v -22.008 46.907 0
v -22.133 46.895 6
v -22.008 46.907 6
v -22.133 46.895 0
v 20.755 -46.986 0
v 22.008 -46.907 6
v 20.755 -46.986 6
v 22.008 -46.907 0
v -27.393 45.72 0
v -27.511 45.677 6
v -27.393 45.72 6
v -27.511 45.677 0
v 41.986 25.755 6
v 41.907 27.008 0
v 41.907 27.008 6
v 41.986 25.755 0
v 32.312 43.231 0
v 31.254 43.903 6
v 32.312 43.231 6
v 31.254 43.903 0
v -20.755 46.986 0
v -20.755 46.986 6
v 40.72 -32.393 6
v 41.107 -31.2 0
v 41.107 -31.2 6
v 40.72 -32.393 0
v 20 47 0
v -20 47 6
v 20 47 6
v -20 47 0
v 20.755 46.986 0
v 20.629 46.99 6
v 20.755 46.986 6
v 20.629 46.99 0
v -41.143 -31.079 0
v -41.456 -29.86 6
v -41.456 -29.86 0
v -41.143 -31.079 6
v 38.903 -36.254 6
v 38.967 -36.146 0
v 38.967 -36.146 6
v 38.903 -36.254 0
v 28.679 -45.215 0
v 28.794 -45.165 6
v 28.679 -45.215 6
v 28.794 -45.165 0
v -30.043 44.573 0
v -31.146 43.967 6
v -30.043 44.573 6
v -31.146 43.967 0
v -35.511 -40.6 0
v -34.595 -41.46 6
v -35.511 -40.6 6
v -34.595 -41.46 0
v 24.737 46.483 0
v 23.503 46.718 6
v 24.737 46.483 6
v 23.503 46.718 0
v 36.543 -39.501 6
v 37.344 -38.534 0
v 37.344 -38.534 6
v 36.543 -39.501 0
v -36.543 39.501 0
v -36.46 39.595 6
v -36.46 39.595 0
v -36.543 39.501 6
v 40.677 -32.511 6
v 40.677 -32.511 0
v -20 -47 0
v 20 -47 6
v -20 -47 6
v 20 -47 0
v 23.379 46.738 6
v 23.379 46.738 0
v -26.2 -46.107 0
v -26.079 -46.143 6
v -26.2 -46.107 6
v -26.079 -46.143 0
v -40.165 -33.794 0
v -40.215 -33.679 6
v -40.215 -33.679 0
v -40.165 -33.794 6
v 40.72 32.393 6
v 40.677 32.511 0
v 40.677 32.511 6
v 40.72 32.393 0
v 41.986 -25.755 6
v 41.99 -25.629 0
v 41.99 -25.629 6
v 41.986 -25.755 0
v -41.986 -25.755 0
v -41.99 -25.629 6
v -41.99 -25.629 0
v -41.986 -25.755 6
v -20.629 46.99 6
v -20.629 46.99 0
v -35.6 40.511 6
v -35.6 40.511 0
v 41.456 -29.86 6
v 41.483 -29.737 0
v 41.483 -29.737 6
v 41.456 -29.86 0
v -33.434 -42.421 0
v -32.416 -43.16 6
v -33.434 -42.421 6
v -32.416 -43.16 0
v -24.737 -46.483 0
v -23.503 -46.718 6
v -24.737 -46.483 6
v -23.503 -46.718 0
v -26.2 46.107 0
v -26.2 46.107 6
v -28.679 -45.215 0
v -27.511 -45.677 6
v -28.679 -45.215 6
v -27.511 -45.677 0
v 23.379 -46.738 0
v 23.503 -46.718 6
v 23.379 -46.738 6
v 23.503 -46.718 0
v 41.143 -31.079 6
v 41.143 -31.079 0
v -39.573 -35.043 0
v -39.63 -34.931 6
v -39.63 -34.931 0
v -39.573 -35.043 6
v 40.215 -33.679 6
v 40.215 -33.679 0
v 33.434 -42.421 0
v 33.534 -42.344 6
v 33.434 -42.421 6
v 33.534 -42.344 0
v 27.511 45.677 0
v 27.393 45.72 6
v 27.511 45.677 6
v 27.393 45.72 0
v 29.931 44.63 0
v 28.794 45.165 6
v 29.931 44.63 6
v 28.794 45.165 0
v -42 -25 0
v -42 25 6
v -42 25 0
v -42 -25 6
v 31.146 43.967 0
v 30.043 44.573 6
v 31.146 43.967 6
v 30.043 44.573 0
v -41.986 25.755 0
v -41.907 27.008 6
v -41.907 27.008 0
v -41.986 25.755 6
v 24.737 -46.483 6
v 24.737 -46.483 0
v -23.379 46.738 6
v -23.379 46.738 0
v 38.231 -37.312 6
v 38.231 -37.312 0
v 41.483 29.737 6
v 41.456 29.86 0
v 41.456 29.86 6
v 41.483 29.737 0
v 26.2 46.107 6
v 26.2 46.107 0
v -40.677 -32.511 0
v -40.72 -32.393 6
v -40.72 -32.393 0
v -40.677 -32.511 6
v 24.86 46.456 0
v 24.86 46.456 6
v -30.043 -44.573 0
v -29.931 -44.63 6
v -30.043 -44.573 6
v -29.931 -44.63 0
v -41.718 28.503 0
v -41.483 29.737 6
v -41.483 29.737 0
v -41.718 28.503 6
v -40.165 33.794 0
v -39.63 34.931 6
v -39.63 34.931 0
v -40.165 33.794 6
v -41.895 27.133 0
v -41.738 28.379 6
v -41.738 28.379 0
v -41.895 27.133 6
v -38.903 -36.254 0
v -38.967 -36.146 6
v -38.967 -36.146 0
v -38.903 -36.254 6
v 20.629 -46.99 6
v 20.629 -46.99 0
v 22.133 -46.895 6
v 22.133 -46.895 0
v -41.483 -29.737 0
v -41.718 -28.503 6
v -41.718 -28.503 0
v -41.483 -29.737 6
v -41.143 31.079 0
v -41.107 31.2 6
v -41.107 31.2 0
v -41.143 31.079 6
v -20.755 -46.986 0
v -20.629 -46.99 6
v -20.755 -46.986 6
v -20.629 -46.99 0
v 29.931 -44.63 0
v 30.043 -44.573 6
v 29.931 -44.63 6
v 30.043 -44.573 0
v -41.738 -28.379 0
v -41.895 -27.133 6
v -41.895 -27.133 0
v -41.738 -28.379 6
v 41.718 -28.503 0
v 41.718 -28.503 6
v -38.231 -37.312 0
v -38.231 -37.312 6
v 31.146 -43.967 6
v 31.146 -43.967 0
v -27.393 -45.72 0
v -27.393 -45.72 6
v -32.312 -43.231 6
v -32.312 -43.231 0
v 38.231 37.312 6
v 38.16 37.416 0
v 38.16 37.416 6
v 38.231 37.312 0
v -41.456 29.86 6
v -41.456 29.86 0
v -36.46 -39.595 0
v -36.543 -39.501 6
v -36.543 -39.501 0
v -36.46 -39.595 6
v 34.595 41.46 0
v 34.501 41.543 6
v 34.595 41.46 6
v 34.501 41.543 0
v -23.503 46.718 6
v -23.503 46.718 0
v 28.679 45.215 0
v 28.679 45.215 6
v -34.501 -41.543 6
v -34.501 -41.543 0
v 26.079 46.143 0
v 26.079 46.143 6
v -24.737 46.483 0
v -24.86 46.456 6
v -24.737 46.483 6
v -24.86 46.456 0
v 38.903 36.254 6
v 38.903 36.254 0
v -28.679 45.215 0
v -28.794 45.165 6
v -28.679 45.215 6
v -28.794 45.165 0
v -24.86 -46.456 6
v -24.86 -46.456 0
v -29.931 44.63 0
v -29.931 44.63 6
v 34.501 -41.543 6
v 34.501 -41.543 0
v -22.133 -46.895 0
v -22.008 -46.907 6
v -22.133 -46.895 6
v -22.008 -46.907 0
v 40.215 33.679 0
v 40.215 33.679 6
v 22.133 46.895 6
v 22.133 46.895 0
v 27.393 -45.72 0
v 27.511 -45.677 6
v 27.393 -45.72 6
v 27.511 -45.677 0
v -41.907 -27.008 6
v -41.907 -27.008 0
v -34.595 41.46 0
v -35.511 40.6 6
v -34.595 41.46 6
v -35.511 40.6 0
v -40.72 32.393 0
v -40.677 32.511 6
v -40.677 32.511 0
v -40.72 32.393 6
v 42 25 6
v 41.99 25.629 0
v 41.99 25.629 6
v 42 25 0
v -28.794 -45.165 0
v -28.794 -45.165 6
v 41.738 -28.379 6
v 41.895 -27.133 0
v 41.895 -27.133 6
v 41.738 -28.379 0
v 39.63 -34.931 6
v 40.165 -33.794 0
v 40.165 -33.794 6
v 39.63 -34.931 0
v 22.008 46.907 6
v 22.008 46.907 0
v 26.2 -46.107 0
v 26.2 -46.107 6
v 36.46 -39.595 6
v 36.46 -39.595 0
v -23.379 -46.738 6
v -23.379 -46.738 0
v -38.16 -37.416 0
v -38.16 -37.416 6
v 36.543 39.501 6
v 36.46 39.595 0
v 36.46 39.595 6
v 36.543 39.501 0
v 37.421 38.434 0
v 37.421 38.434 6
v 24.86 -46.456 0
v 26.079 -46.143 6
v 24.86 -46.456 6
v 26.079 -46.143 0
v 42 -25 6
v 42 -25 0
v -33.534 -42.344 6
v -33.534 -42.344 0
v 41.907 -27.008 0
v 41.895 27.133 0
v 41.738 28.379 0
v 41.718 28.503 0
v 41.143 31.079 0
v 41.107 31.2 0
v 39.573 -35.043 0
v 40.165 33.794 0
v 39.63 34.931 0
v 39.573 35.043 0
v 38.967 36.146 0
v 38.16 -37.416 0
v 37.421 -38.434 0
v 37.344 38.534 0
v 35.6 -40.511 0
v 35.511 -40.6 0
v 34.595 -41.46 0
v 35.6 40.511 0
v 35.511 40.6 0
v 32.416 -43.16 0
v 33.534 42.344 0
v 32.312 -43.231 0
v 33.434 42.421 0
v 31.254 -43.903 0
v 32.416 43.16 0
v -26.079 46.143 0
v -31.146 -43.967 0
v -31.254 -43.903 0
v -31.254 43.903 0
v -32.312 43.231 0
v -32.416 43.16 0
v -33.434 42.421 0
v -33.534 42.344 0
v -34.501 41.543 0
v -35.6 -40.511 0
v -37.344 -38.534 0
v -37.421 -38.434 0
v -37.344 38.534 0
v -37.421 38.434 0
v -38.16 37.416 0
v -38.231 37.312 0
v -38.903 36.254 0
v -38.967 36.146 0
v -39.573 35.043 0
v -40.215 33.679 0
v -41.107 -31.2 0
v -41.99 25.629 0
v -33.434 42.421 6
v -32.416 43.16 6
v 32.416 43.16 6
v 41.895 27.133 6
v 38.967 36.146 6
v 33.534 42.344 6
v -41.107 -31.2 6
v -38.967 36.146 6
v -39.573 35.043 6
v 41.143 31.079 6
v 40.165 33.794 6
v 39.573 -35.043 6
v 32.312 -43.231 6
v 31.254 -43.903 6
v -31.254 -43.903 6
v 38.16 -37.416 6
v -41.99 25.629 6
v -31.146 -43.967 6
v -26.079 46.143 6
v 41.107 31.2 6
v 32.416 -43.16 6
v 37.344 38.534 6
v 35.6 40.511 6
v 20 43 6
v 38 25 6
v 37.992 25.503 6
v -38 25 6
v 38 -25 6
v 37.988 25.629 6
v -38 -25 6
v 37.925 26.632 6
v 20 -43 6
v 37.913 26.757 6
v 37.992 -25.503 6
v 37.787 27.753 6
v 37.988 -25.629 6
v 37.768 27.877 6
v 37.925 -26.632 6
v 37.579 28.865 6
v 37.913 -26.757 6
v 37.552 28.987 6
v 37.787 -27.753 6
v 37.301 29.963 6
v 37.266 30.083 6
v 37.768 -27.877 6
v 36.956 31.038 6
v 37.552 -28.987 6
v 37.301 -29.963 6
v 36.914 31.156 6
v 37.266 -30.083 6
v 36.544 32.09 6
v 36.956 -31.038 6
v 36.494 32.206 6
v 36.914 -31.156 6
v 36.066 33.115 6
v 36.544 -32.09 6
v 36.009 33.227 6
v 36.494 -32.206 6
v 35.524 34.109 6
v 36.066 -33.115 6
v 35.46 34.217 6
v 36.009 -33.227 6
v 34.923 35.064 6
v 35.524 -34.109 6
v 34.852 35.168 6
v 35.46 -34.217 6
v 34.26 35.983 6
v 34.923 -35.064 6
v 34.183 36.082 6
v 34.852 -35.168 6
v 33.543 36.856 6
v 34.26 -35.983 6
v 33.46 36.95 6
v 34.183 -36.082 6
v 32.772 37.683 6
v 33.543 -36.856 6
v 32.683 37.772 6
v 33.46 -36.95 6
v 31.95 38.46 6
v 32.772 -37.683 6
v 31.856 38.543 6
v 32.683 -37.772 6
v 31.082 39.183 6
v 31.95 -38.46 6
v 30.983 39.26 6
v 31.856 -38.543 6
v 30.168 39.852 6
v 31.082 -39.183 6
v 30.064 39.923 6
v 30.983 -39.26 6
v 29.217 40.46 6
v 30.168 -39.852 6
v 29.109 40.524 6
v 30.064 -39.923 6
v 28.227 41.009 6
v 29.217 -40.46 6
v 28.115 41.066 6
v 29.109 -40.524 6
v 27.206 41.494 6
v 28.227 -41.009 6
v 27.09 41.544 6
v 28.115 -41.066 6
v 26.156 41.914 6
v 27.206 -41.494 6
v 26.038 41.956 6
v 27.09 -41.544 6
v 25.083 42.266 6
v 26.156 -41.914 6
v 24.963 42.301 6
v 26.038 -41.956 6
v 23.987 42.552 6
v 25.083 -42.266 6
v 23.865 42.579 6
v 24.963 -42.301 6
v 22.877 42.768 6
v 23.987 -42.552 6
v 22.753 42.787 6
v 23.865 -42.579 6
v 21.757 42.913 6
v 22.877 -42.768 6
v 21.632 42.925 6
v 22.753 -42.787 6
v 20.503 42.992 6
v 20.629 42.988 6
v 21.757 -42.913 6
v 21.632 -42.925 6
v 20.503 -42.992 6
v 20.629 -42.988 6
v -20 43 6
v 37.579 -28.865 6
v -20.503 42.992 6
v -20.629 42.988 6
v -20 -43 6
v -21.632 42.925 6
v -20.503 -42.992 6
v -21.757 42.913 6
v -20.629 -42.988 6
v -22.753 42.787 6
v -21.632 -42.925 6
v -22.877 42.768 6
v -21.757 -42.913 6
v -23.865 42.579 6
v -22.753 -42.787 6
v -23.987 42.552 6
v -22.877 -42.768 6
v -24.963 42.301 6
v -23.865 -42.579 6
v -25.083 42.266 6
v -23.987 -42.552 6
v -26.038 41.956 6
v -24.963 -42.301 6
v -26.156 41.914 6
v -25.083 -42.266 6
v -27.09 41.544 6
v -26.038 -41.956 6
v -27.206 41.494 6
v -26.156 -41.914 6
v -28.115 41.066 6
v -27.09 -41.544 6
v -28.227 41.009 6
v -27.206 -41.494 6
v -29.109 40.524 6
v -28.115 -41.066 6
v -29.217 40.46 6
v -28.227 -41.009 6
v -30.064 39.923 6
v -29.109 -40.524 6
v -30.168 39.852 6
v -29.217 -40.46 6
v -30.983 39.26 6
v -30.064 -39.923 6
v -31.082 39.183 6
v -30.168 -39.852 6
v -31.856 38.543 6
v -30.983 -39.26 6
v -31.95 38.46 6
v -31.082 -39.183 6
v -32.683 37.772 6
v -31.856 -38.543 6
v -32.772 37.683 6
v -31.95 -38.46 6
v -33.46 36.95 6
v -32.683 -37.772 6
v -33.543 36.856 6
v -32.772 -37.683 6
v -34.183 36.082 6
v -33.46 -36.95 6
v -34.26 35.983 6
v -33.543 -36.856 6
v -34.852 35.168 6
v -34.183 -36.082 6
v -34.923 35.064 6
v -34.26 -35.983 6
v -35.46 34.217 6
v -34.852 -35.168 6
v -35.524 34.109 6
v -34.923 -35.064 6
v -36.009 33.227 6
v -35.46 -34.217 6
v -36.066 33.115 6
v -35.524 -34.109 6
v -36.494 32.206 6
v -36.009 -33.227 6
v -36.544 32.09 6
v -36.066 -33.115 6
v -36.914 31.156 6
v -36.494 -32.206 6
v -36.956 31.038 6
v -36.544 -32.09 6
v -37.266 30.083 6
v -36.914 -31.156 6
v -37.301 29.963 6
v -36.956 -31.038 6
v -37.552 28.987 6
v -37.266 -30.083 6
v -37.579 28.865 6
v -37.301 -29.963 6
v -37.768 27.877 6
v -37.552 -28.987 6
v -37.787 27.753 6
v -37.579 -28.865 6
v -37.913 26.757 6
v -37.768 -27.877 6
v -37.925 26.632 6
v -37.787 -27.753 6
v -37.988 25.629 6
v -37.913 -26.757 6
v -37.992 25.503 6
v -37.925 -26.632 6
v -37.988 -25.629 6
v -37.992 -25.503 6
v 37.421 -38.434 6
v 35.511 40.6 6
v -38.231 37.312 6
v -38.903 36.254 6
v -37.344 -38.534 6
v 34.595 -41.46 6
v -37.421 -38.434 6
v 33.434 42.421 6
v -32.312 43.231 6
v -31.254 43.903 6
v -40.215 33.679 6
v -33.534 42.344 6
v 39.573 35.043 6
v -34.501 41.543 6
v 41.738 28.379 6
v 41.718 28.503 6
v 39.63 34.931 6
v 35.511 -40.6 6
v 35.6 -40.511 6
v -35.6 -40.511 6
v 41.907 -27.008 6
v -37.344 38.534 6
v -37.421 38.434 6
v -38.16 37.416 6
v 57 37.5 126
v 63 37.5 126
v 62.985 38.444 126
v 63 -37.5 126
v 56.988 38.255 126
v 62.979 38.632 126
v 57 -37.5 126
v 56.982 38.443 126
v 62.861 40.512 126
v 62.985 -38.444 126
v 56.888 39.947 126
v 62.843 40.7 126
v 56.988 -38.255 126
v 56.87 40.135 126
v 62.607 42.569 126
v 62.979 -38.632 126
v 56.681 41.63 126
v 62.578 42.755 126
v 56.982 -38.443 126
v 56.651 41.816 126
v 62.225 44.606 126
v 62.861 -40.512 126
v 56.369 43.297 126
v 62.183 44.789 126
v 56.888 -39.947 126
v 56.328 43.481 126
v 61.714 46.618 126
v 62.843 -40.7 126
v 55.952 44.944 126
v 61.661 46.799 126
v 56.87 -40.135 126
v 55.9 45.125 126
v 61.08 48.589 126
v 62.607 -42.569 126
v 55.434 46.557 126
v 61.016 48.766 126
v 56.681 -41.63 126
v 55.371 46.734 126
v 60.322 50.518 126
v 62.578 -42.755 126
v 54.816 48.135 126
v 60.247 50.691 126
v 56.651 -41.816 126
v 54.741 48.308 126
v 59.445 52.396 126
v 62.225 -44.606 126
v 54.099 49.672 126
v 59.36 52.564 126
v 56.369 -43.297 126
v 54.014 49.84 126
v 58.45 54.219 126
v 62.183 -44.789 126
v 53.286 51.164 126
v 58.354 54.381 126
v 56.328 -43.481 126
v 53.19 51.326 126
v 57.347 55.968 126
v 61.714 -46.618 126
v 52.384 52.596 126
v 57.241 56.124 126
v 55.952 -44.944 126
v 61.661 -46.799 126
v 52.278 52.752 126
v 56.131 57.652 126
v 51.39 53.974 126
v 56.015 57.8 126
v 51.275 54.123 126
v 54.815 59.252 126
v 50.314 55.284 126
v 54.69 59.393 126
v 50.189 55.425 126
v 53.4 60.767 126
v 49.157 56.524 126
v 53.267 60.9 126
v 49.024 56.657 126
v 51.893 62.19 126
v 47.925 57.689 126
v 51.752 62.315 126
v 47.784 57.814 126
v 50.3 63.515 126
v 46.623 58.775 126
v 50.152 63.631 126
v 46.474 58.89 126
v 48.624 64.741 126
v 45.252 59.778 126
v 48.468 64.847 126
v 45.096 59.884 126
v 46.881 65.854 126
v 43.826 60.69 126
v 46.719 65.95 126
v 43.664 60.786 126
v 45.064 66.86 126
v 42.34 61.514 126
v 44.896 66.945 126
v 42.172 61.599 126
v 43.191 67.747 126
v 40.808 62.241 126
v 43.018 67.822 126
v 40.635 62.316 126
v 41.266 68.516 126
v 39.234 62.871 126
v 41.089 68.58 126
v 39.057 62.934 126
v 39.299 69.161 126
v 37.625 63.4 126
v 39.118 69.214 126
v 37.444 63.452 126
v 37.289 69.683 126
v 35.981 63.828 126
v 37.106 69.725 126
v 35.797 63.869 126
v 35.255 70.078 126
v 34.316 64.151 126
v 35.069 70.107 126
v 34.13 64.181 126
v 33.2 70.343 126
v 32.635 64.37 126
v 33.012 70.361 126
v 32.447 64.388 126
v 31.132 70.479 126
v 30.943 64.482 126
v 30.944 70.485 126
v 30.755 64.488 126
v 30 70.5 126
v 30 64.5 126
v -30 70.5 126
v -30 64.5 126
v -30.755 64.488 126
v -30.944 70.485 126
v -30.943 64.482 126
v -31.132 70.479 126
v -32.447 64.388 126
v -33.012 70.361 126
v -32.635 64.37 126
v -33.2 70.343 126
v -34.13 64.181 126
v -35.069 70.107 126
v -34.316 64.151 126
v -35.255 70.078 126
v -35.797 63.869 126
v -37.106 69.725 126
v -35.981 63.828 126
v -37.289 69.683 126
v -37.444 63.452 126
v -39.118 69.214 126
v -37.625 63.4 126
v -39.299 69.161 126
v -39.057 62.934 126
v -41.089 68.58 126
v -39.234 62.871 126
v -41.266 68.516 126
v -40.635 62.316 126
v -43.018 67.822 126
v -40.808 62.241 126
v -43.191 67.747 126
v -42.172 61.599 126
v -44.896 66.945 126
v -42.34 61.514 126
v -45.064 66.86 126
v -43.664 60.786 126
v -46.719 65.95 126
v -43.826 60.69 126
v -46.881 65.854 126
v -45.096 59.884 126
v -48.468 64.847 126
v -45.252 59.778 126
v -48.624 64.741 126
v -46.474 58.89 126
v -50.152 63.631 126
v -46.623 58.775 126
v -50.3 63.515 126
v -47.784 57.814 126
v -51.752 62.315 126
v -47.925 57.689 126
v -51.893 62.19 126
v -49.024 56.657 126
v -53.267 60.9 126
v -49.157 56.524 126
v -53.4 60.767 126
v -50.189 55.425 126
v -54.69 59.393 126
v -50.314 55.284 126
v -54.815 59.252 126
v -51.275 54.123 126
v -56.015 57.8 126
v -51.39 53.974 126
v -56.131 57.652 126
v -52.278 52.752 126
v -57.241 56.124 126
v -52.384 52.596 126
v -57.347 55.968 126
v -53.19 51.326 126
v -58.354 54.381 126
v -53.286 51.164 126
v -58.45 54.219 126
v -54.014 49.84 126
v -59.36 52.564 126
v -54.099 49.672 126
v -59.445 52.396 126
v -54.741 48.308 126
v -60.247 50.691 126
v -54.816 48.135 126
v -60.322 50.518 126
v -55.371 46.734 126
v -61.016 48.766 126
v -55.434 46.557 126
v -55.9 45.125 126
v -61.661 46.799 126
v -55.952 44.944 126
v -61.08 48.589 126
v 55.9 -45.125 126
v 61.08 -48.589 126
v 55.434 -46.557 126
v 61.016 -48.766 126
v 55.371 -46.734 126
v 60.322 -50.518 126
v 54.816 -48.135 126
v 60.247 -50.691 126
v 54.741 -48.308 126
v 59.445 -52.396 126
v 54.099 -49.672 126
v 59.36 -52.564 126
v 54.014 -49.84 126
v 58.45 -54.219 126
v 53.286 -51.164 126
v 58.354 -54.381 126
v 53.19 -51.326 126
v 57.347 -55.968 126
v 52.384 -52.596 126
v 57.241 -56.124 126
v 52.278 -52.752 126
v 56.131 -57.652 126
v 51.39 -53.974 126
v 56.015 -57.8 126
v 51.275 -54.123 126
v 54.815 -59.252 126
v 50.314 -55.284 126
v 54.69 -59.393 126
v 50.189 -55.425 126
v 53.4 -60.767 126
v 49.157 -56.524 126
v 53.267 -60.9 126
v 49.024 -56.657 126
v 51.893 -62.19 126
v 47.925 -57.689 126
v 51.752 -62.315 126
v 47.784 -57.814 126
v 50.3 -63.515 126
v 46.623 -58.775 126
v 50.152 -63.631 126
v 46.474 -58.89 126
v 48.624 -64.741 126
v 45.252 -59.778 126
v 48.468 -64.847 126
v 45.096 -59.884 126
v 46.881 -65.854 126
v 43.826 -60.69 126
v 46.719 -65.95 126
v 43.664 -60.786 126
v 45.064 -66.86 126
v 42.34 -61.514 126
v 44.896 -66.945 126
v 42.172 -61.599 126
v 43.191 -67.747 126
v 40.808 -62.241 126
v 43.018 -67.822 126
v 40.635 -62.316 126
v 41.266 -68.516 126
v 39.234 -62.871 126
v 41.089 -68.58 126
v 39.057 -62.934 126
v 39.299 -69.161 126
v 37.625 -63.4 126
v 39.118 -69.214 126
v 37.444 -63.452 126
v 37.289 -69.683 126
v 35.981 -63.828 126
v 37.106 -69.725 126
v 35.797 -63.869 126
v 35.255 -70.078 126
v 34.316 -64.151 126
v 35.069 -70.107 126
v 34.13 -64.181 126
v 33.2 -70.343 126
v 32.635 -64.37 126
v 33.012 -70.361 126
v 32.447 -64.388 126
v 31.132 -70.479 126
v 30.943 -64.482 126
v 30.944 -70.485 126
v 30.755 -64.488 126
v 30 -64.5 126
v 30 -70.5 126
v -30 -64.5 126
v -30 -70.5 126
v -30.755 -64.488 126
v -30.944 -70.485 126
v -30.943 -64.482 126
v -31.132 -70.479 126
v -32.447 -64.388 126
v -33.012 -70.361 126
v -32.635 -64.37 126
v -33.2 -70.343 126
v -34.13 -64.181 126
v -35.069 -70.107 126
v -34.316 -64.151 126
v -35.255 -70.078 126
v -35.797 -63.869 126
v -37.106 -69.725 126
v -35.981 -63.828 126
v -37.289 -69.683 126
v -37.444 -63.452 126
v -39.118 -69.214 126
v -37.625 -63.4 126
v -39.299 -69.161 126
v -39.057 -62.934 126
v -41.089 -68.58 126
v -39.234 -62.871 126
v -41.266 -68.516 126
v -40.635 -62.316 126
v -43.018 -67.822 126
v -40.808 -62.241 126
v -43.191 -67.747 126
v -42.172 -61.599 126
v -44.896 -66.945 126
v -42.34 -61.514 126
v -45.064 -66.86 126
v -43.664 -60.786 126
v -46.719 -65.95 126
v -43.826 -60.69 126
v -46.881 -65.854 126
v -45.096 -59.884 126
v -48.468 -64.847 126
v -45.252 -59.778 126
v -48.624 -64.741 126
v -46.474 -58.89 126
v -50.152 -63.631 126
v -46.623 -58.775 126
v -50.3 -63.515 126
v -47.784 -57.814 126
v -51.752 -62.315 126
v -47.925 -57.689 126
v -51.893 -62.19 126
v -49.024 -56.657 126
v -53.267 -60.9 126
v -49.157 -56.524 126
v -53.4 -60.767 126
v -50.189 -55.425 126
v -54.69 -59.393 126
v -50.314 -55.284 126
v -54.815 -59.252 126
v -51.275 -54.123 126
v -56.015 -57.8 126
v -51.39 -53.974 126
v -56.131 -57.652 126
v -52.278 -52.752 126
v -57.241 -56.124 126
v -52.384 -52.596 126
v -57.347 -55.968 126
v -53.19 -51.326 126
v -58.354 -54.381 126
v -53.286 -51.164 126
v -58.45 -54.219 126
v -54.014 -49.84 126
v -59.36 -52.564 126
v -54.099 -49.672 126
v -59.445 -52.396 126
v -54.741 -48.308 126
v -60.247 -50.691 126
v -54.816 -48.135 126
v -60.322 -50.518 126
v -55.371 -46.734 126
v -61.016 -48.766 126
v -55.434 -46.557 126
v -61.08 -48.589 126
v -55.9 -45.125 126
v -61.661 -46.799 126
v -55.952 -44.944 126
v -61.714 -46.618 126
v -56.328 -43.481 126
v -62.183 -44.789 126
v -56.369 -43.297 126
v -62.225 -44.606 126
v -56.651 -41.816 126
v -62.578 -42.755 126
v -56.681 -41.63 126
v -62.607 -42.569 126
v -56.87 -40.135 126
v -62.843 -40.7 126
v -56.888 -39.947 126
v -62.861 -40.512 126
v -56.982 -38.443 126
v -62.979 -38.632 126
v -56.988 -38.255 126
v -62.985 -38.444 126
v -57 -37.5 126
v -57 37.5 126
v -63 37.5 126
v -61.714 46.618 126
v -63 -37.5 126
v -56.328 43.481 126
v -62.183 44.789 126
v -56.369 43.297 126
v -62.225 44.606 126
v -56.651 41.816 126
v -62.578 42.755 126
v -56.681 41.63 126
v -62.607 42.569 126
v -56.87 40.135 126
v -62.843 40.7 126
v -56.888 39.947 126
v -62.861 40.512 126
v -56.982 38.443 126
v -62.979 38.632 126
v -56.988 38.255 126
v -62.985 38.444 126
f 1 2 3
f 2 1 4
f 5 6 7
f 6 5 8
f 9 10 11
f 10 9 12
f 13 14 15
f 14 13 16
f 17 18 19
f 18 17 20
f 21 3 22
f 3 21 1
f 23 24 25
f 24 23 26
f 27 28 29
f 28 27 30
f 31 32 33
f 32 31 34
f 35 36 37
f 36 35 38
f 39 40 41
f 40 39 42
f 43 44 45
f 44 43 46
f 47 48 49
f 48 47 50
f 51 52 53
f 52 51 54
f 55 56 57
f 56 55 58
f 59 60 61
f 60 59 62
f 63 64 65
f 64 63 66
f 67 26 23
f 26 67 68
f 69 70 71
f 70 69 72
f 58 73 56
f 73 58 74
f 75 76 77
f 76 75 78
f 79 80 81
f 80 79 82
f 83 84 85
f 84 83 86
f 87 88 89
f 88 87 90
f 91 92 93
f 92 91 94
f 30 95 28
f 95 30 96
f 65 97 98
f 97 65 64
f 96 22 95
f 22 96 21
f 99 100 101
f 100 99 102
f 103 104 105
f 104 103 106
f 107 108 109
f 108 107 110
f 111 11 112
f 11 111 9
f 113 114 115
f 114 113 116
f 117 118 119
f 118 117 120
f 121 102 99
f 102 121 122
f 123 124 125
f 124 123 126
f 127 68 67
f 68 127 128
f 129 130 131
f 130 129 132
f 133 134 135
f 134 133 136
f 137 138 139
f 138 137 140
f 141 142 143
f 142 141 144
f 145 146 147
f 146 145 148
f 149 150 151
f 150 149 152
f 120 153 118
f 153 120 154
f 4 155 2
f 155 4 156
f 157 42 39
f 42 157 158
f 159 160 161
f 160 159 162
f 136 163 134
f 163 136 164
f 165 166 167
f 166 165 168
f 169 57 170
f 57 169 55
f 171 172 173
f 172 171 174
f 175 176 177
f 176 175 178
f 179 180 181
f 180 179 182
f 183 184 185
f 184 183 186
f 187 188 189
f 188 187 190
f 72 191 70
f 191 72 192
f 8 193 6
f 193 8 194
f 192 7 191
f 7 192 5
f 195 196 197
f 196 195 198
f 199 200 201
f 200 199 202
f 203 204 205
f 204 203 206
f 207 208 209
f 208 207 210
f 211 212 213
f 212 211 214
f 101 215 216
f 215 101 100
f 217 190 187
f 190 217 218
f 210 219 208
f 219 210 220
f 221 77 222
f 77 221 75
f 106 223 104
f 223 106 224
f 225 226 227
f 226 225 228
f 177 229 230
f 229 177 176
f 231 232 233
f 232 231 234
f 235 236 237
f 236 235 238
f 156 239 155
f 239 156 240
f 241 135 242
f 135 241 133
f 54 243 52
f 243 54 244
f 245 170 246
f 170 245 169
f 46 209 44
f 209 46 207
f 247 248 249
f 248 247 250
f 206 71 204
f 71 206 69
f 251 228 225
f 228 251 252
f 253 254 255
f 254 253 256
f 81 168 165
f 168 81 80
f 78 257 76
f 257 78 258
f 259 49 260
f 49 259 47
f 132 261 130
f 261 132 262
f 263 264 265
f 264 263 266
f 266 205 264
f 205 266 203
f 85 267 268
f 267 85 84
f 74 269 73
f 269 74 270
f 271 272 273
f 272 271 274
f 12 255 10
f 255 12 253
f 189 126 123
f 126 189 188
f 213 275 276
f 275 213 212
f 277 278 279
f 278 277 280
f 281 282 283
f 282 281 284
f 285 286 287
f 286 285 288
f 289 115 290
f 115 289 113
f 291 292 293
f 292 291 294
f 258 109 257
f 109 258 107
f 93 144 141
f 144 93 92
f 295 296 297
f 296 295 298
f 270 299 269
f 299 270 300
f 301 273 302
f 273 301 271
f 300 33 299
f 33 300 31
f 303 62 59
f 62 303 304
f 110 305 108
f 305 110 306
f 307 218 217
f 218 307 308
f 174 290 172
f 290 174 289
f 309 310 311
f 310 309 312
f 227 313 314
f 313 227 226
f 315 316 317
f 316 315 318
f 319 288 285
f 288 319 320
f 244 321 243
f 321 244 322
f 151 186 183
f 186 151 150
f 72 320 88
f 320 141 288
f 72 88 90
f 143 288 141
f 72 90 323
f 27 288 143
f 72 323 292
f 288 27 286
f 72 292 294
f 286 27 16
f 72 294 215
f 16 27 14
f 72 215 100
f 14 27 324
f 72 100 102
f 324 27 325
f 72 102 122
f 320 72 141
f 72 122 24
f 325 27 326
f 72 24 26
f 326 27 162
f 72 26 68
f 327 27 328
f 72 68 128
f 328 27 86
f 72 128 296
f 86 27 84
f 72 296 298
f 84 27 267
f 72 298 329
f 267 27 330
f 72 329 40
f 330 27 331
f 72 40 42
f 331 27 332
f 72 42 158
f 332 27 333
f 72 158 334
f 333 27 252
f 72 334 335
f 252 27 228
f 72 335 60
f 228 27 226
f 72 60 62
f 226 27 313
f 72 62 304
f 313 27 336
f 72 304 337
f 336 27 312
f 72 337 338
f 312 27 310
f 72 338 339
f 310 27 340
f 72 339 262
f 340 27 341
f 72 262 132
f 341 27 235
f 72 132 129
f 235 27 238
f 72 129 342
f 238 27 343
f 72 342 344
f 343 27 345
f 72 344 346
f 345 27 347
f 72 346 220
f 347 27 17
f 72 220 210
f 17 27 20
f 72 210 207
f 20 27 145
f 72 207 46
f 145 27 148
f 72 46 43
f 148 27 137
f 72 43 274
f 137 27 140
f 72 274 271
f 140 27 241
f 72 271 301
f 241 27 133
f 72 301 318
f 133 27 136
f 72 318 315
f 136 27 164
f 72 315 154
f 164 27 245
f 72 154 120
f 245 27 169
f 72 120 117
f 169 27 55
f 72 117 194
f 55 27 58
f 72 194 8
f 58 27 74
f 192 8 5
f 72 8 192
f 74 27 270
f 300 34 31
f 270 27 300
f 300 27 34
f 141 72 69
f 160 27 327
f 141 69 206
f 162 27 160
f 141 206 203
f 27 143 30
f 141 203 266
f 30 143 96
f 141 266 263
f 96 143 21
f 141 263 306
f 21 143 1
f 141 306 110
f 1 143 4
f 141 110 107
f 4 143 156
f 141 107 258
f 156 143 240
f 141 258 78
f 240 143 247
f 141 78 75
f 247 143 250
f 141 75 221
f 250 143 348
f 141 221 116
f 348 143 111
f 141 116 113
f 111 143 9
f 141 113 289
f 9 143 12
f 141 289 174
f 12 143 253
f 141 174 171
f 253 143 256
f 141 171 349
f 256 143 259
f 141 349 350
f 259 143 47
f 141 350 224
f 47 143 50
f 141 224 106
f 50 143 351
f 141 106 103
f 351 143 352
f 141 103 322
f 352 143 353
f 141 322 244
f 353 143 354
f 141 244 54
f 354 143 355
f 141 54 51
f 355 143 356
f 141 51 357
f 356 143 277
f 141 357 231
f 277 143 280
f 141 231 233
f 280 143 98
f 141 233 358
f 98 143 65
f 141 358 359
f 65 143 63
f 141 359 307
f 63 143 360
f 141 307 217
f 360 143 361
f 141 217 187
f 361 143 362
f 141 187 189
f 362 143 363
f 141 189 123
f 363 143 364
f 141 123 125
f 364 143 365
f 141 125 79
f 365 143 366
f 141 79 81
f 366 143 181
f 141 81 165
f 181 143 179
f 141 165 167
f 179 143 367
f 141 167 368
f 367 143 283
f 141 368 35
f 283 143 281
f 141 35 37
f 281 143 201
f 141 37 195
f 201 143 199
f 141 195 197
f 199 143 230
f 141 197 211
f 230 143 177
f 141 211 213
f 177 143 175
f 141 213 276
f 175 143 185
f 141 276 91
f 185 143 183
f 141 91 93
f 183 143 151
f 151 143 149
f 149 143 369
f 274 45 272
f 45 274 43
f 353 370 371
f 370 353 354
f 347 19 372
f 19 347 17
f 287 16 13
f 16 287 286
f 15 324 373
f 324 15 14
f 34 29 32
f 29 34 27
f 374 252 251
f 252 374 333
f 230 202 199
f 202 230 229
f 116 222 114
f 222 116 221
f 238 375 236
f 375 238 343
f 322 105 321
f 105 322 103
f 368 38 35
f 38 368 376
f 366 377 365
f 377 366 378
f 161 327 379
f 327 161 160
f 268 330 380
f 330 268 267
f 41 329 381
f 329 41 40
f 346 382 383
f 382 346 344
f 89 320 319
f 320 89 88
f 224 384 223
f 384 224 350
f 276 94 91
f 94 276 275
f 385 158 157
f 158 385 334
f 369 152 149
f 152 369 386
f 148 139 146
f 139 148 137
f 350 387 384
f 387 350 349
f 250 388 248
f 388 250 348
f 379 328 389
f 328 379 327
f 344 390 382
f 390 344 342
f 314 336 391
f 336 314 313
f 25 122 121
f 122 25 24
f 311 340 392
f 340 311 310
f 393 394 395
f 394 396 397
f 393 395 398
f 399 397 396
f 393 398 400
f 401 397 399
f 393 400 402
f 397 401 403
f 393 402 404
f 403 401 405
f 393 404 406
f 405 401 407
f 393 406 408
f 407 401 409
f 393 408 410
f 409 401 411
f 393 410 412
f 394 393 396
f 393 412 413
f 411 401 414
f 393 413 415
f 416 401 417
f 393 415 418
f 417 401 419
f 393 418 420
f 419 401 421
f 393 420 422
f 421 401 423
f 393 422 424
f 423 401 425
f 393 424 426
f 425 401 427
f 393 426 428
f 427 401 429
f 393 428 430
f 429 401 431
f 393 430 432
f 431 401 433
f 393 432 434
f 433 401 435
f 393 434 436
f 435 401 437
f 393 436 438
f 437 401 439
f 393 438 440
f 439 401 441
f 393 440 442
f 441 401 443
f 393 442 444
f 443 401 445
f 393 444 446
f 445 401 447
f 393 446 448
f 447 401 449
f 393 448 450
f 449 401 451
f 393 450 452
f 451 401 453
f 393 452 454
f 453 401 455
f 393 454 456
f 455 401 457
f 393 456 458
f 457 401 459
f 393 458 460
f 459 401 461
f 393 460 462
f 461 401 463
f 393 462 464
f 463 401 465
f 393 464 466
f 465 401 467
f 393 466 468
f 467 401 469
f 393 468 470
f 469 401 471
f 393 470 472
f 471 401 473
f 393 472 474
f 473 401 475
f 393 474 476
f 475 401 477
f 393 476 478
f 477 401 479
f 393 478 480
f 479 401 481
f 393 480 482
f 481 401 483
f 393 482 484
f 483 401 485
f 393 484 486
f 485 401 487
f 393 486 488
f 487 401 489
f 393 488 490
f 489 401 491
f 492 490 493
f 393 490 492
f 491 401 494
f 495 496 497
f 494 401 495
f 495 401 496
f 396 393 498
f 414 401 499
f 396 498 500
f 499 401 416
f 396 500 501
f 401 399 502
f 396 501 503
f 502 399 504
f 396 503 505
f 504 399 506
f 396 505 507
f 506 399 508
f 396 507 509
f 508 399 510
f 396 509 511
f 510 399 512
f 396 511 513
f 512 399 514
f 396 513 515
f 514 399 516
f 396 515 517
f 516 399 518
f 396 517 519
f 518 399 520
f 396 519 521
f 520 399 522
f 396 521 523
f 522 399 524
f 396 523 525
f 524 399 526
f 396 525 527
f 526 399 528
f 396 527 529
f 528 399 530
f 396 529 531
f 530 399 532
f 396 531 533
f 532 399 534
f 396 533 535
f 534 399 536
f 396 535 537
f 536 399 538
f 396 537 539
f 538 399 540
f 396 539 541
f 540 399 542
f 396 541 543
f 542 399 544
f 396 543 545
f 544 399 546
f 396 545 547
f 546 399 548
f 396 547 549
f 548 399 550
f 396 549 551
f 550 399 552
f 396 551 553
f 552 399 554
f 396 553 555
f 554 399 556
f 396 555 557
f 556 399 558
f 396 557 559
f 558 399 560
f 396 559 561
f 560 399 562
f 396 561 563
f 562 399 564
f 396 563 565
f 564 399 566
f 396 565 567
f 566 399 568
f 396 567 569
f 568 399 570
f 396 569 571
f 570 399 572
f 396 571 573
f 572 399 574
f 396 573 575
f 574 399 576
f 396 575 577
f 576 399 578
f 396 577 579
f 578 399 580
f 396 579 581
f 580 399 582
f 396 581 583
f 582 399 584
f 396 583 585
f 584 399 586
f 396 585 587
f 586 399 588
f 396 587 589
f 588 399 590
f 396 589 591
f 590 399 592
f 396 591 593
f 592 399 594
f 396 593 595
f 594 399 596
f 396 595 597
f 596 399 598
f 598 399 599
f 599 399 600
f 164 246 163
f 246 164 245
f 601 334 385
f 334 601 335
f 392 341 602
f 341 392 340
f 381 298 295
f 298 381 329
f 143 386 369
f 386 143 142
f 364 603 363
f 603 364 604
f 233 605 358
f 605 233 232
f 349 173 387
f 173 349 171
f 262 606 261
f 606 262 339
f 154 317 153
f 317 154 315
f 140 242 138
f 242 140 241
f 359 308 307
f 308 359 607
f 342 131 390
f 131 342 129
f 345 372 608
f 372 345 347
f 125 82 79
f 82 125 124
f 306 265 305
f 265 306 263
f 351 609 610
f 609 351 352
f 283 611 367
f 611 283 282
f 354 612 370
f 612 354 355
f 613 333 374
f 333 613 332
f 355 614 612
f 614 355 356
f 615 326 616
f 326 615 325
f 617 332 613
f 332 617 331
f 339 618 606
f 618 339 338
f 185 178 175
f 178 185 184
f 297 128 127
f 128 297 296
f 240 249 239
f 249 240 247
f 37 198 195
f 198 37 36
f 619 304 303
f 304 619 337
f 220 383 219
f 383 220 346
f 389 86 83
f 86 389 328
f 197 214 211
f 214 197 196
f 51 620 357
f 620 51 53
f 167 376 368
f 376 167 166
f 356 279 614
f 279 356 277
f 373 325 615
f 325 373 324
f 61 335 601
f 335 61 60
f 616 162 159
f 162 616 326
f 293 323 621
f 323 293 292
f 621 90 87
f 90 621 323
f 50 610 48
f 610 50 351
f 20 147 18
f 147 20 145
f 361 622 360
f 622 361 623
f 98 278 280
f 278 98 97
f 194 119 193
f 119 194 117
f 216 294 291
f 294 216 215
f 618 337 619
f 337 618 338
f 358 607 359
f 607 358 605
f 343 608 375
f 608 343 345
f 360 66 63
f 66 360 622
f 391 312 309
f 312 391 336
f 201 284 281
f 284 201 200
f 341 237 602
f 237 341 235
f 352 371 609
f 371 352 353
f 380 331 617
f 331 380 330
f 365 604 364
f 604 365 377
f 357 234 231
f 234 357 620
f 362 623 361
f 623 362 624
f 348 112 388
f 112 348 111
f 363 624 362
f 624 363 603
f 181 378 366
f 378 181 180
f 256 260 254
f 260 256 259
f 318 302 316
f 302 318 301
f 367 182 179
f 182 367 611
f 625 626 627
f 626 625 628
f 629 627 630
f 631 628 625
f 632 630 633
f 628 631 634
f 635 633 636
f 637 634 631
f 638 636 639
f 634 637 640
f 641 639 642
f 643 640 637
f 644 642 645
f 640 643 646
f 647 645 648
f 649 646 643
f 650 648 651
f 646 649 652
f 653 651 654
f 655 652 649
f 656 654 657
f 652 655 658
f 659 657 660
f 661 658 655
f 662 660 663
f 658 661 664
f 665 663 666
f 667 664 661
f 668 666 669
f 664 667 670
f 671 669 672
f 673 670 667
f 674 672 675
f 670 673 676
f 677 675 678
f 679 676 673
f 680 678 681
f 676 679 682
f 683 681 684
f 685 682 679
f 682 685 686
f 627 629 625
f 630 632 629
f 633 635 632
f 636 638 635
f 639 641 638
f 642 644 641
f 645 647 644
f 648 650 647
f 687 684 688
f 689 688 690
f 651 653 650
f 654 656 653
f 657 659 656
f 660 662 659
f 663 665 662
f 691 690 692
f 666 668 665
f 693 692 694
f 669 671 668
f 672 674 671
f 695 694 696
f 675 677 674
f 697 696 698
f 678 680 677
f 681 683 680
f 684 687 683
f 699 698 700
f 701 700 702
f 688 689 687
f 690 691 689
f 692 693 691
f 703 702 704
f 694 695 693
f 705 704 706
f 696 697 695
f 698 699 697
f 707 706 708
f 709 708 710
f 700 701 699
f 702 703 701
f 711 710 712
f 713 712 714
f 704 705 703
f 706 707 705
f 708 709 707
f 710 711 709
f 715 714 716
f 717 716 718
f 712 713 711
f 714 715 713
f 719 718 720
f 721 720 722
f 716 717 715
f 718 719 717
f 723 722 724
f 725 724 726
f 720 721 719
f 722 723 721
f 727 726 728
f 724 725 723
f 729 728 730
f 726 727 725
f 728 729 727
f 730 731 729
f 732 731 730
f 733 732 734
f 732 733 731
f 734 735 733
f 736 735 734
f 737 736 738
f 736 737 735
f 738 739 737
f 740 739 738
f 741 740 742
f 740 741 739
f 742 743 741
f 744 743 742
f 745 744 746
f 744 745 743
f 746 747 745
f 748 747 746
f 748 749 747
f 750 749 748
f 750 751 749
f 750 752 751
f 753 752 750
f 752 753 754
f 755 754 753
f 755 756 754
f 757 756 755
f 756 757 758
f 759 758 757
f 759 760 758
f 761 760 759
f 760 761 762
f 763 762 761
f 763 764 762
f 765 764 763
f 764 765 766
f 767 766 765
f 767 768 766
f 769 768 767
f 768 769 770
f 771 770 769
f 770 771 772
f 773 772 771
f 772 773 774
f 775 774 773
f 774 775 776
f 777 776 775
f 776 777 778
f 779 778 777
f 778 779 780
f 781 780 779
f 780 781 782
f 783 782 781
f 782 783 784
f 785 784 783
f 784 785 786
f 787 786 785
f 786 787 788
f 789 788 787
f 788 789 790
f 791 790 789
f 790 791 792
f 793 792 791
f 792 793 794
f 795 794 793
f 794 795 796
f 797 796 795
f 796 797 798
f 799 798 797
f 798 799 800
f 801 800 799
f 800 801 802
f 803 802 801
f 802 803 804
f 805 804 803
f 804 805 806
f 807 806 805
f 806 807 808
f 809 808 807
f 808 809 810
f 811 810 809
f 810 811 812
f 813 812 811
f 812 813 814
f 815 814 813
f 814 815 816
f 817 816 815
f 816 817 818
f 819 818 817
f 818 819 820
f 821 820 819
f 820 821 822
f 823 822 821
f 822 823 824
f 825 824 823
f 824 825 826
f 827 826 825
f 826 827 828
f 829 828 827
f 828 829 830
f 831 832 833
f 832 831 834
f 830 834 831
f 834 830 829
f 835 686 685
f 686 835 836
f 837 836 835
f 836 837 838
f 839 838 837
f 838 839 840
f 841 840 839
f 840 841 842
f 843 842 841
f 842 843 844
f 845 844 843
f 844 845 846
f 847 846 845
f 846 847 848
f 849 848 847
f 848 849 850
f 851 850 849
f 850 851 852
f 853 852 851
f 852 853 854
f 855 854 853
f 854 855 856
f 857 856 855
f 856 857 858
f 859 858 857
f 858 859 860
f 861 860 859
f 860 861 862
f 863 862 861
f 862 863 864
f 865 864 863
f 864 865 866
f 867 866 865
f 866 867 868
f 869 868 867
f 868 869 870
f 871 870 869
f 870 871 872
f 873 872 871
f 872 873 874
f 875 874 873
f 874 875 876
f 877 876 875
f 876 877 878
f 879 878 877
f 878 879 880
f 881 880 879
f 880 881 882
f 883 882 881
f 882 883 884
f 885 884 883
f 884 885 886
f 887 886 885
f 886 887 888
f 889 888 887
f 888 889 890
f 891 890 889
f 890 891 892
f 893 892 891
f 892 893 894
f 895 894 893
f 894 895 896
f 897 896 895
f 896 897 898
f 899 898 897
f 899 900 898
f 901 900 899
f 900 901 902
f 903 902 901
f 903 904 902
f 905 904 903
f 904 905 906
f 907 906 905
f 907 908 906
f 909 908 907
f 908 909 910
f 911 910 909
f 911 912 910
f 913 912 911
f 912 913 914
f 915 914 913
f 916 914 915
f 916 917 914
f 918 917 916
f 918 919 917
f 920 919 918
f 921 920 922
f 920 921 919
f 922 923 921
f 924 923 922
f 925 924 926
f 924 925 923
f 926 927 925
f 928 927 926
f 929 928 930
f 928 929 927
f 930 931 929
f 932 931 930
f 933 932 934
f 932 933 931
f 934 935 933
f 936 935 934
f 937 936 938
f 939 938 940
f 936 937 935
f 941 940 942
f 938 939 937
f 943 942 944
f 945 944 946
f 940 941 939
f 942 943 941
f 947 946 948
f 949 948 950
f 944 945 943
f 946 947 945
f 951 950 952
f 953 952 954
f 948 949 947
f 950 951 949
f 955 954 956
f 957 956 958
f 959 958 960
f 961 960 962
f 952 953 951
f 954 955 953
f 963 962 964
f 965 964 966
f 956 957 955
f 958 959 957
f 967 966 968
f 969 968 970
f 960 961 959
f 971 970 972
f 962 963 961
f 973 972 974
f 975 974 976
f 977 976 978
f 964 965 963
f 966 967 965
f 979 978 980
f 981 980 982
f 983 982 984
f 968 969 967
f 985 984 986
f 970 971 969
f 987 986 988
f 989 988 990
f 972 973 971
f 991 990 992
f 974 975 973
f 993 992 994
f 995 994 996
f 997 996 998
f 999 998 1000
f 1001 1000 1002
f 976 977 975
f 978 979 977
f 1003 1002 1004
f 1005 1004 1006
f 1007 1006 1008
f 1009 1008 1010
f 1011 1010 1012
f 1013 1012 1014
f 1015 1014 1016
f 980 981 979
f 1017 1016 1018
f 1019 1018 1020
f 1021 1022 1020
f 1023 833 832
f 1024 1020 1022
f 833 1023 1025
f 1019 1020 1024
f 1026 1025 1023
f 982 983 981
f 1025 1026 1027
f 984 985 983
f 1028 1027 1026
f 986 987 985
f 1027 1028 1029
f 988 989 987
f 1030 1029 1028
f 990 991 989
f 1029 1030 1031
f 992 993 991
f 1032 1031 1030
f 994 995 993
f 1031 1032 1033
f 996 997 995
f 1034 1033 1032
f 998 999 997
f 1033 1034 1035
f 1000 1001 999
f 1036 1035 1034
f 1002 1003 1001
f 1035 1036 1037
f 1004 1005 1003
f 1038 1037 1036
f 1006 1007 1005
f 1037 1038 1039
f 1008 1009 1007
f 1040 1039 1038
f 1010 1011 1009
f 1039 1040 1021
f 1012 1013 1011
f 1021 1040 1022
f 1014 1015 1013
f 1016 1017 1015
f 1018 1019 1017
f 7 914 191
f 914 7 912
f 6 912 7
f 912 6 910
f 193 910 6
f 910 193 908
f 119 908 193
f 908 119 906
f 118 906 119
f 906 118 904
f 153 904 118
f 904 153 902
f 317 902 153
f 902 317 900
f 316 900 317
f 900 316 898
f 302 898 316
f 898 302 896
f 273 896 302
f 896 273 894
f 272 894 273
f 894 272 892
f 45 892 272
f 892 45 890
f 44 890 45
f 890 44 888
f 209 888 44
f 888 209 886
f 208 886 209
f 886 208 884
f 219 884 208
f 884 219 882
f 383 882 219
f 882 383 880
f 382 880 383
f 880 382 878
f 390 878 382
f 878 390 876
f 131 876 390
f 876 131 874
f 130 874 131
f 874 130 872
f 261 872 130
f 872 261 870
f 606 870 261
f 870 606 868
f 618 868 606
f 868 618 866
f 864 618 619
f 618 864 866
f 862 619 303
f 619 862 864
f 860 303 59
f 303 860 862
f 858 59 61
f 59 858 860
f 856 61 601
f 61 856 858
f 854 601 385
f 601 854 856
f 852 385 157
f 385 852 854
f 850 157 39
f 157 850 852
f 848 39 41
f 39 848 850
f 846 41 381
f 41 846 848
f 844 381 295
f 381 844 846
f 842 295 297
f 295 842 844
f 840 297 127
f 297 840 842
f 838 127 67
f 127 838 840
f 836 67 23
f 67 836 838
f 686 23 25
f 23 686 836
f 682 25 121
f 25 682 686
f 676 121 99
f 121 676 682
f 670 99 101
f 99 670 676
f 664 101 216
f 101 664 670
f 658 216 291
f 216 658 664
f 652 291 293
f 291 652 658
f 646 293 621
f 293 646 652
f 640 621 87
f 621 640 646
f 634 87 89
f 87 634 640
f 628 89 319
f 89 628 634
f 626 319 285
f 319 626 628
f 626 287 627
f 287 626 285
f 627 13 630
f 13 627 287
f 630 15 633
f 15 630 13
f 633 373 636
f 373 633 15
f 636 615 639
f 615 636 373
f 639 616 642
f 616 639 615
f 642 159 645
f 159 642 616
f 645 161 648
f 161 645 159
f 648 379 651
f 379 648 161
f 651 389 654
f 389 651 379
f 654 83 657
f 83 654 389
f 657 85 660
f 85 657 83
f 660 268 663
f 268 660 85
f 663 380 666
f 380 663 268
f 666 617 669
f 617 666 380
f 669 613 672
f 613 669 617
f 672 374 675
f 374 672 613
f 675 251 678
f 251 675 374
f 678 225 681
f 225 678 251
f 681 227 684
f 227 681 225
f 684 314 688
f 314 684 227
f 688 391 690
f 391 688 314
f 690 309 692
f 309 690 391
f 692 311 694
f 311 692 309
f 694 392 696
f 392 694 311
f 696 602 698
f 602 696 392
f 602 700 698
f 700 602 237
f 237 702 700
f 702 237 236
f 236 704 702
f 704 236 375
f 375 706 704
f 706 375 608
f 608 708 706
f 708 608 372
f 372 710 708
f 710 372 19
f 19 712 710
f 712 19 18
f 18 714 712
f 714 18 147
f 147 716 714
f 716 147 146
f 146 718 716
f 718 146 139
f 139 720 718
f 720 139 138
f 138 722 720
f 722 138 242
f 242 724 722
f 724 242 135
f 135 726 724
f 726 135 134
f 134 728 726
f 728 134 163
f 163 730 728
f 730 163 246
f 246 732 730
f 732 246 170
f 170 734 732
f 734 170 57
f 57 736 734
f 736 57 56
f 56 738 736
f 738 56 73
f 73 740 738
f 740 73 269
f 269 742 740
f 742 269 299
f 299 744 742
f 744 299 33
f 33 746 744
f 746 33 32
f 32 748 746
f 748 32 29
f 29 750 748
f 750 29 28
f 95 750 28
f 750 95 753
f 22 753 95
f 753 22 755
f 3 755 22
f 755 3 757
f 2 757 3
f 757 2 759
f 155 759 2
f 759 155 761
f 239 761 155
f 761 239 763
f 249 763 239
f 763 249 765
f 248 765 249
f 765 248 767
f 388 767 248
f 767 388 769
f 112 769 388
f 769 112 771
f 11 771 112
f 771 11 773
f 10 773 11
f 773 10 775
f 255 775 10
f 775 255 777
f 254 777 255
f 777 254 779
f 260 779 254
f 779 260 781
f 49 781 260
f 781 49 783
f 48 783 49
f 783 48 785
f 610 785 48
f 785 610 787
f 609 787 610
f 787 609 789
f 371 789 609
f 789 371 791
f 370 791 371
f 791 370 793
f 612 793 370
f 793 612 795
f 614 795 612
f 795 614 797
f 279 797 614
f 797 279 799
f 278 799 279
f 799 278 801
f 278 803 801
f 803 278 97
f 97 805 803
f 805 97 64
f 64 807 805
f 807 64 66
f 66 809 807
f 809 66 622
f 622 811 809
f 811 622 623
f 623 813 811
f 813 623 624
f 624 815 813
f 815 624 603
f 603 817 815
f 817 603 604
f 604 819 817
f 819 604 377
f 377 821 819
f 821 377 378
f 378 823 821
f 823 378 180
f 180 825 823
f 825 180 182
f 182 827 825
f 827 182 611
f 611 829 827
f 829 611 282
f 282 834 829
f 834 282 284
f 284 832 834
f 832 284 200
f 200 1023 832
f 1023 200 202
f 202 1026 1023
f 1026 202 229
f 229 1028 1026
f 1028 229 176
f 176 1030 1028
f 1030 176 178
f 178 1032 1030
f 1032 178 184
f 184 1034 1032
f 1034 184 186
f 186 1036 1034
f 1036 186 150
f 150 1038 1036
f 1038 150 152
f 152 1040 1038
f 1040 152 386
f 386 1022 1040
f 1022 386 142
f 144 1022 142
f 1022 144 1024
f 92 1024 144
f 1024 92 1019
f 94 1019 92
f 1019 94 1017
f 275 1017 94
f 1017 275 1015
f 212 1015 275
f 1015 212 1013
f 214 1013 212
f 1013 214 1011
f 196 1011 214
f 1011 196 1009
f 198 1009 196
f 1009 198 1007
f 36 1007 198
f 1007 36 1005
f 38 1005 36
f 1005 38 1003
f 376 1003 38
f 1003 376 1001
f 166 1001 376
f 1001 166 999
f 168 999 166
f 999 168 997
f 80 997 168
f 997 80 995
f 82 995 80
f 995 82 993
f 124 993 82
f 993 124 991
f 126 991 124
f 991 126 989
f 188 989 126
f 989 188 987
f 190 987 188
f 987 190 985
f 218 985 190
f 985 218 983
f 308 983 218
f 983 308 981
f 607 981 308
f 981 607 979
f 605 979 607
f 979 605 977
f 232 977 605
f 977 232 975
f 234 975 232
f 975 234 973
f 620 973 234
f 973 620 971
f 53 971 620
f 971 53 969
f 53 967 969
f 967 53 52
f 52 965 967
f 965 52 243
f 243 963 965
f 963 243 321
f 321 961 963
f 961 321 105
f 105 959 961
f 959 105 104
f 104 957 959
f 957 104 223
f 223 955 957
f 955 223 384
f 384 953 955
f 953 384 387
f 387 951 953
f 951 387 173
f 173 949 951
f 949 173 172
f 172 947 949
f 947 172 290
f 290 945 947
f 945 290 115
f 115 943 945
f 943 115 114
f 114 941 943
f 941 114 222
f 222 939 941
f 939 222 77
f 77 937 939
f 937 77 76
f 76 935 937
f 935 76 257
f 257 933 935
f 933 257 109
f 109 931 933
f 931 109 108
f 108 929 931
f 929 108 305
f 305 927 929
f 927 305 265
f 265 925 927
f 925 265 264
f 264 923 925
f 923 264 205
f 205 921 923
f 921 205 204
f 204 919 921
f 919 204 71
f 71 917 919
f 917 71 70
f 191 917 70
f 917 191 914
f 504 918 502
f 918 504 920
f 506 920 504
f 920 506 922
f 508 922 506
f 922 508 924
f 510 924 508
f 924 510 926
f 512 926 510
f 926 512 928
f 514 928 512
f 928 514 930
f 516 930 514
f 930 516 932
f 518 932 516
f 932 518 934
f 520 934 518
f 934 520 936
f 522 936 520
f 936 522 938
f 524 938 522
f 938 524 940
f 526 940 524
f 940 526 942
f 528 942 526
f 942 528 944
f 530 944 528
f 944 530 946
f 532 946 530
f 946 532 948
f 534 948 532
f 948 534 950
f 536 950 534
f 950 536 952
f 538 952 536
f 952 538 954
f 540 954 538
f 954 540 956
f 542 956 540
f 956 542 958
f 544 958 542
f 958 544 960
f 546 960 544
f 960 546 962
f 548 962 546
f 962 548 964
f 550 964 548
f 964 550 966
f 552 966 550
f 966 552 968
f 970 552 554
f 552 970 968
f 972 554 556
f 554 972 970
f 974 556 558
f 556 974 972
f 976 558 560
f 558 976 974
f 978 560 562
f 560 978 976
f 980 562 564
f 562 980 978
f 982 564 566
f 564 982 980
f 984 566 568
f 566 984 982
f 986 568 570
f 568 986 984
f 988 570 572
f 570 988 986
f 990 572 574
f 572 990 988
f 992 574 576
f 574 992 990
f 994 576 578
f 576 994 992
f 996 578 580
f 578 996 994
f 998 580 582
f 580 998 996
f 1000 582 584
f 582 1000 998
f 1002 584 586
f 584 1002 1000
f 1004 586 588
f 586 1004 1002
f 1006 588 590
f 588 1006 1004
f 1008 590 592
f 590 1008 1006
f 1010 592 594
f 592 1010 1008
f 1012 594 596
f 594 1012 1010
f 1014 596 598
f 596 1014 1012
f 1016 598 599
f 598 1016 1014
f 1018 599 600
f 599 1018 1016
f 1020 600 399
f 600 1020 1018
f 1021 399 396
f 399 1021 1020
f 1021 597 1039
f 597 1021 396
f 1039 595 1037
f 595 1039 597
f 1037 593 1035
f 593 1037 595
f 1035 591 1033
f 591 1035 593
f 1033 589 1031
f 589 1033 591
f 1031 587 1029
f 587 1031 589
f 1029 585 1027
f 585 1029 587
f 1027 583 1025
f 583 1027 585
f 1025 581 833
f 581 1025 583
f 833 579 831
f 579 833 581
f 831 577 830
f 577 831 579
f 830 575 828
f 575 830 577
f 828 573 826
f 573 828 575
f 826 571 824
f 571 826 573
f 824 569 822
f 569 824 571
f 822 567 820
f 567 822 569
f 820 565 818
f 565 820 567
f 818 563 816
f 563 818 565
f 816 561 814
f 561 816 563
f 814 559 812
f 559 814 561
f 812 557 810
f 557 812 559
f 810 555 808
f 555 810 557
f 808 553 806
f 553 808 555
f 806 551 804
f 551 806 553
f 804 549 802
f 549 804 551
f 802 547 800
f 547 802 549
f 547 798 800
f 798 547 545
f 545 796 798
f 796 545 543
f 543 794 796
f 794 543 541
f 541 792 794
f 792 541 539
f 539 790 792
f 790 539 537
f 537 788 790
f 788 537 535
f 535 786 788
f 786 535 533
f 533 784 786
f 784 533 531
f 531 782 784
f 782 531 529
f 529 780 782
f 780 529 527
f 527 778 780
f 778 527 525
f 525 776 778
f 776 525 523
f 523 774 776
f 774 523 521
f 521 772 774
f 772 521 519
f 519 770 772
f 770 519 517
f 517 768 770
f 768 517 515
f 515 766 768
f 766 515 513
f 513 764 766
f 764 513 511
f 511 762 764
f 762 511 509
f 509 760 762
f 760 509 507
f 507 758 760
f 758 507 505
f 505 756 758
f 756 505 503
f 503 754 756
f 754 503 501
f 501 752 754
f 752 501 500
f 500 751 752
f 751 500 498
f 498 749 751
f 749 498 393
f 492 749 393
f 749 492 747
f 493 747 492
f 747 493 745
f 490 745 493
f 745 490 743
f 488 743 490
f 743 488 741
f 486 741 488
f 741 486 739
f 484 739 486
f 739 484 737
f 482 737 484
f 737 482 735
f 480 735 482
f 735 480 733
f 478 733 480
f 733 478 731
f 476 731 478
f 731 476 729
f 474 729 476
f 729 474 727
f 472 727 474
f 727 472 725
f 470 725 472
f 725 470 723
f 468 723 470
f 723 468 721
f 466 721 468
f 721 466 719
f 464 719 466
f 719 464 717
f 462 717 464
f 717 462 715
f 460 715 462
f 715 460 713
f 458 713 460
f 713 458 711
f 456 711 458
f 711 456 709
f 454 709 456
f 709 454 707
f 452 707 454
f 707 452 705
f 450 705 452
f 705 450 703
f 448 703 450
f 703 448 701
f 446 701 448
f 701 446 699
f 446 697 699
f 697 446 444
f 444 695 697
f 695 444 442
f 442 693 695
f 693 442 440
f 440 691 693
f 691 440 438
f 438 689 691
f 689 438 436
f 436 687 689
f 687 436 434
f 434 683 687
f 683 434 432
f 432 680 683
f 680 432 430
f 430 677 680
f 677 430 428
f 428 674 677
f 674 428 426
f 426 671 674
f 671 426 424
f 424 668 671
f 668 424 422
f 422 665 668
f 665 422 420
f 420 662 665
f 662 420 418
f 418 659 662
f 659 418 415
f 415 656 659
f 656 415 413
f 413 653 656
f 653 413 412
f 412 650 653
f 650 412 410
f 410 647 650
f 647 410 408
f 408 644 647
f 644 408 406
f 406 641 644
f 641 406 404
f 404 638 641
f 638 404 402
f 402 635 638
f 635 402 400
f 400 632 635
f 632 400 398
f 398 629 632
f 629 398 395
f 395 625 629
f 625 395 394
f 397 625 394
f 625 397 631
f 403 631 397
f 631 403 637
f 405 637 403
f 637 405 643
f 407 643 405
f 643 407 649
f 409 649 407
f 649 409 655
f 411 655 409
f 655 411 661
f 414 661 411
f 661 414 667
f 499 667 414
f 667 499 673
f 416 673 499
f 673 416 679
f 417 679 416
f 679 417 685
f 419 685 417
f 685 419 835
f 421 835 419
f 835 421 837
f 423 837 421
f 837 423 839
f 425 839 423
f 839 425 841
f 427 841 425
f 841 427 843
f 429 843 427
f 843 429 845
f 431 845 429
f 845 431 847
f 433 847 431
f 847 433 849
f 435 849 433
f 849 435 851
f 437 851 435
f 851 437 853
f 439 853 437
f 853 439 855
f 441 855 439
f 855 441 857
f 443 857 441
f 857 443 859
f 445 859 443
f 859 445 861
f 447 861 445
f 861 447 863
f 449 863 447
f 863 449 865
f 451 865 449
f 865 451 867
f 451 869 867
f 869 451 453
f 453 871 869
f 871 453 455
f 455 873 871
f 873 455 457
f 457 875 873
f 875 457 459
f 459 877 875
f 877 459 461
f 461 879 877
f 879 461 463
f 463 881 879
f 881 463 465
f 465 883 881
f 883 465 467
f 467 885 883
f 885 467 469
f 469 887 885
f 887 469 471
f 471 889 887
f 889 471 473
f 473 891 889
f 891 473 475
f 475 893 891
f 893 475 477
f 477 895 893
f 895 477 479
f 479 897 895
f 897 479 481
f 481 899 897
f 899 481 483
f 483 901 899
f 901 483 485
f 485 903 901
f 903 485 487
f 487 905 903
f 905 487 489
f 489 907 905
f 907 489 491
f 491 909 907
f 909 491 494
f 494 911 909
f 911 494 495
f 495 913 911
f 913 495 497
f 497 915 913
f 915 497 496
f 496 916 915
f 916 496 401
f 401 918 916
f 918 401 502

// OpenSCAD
///base shape
Length = 40;
Width = 50;
edge = 2;
thickness = 4;
////body form guides
RimHeight = 3;
BodyHeight = 120;
BaseHeight = 6;
Opening = 1.5;
$fn = 100;
////hex pattern guides
HLlength = 200;
Patternbegin = 28;
hexSize = 11.5;

base();
//difference(){
    body();
  //  HexPattern();
//}
//rim();

//////hex shape/////////////////////////////
/*
*rotate(90,[0,1,0]){
    circle(hexSize,$fn=6);
}
*/
////////////////////////////////////////////
////////////MODULES/////////////////////////
/////////////////////////

module BaseShape(solid){
    difference(){
        offset(20)
            minkowski(){
                square([40,50],true);
                circle(edge);
            }
        if (solid=="no"){
            offset(20-thickness){
                minkowski(){
                    square([Length,Width],true);
                    circle(edge);
                }
            }
        }
    }
}

module base(){
    translate([0,0,0]){
        linear_extrude(BaseHeight){
            BaseShape(solid="yea");
        }
    }
}

module rim(){
    translate([0,0,BodyHeight+BaseHeight]){
        linear_extrude(RimHeight){
            scale(Opening){
                BaseShape(solid="no");
            }
        }
    }
}

module body(){
    translate([0,0,BaseHeight]){
        linear_extrude(height=BodyHeight,scale=Opening){
            BaseShape(solid="no");
        }
    }
}

module hexlog(){
    translate([-HLlength/2,0,Patternbegin]){
        rotate(90,[0,1,0]){
            linear_extrude(HLlength){
                circle(hexSize,$fn=6);
            }
        }
    }
}

module hexPatternSingle(){
    hexlog();
    rotate(30,[0,0,1]){
        hexlog();
    }
    rotate(60,[0,0,1]){
        hexlog();
    }
    rotate(90,[0,0,1]){
        hexlog();
    }
    rotate(120,[0,0,1]){
        hexlog();
    }
    rotate(150,[0,0,1]){
        hexlog();
    }
}

module HexPattern(){
    hexPatternSingle();
    translate([0,0,hexSize*2]){
        rotate(15,[0,0,1]){
            hexPatternSingle();
        }
    }
    translate([0,0,hexSize*4]){
        rotate(30,[0,0,1]){
            hexPatternSingle();
        }
    }
    translate([0,0,hexSize*6]){
        rotate(45,[0,0,1]){
            hexPatternSingle();
        }
    }
}
